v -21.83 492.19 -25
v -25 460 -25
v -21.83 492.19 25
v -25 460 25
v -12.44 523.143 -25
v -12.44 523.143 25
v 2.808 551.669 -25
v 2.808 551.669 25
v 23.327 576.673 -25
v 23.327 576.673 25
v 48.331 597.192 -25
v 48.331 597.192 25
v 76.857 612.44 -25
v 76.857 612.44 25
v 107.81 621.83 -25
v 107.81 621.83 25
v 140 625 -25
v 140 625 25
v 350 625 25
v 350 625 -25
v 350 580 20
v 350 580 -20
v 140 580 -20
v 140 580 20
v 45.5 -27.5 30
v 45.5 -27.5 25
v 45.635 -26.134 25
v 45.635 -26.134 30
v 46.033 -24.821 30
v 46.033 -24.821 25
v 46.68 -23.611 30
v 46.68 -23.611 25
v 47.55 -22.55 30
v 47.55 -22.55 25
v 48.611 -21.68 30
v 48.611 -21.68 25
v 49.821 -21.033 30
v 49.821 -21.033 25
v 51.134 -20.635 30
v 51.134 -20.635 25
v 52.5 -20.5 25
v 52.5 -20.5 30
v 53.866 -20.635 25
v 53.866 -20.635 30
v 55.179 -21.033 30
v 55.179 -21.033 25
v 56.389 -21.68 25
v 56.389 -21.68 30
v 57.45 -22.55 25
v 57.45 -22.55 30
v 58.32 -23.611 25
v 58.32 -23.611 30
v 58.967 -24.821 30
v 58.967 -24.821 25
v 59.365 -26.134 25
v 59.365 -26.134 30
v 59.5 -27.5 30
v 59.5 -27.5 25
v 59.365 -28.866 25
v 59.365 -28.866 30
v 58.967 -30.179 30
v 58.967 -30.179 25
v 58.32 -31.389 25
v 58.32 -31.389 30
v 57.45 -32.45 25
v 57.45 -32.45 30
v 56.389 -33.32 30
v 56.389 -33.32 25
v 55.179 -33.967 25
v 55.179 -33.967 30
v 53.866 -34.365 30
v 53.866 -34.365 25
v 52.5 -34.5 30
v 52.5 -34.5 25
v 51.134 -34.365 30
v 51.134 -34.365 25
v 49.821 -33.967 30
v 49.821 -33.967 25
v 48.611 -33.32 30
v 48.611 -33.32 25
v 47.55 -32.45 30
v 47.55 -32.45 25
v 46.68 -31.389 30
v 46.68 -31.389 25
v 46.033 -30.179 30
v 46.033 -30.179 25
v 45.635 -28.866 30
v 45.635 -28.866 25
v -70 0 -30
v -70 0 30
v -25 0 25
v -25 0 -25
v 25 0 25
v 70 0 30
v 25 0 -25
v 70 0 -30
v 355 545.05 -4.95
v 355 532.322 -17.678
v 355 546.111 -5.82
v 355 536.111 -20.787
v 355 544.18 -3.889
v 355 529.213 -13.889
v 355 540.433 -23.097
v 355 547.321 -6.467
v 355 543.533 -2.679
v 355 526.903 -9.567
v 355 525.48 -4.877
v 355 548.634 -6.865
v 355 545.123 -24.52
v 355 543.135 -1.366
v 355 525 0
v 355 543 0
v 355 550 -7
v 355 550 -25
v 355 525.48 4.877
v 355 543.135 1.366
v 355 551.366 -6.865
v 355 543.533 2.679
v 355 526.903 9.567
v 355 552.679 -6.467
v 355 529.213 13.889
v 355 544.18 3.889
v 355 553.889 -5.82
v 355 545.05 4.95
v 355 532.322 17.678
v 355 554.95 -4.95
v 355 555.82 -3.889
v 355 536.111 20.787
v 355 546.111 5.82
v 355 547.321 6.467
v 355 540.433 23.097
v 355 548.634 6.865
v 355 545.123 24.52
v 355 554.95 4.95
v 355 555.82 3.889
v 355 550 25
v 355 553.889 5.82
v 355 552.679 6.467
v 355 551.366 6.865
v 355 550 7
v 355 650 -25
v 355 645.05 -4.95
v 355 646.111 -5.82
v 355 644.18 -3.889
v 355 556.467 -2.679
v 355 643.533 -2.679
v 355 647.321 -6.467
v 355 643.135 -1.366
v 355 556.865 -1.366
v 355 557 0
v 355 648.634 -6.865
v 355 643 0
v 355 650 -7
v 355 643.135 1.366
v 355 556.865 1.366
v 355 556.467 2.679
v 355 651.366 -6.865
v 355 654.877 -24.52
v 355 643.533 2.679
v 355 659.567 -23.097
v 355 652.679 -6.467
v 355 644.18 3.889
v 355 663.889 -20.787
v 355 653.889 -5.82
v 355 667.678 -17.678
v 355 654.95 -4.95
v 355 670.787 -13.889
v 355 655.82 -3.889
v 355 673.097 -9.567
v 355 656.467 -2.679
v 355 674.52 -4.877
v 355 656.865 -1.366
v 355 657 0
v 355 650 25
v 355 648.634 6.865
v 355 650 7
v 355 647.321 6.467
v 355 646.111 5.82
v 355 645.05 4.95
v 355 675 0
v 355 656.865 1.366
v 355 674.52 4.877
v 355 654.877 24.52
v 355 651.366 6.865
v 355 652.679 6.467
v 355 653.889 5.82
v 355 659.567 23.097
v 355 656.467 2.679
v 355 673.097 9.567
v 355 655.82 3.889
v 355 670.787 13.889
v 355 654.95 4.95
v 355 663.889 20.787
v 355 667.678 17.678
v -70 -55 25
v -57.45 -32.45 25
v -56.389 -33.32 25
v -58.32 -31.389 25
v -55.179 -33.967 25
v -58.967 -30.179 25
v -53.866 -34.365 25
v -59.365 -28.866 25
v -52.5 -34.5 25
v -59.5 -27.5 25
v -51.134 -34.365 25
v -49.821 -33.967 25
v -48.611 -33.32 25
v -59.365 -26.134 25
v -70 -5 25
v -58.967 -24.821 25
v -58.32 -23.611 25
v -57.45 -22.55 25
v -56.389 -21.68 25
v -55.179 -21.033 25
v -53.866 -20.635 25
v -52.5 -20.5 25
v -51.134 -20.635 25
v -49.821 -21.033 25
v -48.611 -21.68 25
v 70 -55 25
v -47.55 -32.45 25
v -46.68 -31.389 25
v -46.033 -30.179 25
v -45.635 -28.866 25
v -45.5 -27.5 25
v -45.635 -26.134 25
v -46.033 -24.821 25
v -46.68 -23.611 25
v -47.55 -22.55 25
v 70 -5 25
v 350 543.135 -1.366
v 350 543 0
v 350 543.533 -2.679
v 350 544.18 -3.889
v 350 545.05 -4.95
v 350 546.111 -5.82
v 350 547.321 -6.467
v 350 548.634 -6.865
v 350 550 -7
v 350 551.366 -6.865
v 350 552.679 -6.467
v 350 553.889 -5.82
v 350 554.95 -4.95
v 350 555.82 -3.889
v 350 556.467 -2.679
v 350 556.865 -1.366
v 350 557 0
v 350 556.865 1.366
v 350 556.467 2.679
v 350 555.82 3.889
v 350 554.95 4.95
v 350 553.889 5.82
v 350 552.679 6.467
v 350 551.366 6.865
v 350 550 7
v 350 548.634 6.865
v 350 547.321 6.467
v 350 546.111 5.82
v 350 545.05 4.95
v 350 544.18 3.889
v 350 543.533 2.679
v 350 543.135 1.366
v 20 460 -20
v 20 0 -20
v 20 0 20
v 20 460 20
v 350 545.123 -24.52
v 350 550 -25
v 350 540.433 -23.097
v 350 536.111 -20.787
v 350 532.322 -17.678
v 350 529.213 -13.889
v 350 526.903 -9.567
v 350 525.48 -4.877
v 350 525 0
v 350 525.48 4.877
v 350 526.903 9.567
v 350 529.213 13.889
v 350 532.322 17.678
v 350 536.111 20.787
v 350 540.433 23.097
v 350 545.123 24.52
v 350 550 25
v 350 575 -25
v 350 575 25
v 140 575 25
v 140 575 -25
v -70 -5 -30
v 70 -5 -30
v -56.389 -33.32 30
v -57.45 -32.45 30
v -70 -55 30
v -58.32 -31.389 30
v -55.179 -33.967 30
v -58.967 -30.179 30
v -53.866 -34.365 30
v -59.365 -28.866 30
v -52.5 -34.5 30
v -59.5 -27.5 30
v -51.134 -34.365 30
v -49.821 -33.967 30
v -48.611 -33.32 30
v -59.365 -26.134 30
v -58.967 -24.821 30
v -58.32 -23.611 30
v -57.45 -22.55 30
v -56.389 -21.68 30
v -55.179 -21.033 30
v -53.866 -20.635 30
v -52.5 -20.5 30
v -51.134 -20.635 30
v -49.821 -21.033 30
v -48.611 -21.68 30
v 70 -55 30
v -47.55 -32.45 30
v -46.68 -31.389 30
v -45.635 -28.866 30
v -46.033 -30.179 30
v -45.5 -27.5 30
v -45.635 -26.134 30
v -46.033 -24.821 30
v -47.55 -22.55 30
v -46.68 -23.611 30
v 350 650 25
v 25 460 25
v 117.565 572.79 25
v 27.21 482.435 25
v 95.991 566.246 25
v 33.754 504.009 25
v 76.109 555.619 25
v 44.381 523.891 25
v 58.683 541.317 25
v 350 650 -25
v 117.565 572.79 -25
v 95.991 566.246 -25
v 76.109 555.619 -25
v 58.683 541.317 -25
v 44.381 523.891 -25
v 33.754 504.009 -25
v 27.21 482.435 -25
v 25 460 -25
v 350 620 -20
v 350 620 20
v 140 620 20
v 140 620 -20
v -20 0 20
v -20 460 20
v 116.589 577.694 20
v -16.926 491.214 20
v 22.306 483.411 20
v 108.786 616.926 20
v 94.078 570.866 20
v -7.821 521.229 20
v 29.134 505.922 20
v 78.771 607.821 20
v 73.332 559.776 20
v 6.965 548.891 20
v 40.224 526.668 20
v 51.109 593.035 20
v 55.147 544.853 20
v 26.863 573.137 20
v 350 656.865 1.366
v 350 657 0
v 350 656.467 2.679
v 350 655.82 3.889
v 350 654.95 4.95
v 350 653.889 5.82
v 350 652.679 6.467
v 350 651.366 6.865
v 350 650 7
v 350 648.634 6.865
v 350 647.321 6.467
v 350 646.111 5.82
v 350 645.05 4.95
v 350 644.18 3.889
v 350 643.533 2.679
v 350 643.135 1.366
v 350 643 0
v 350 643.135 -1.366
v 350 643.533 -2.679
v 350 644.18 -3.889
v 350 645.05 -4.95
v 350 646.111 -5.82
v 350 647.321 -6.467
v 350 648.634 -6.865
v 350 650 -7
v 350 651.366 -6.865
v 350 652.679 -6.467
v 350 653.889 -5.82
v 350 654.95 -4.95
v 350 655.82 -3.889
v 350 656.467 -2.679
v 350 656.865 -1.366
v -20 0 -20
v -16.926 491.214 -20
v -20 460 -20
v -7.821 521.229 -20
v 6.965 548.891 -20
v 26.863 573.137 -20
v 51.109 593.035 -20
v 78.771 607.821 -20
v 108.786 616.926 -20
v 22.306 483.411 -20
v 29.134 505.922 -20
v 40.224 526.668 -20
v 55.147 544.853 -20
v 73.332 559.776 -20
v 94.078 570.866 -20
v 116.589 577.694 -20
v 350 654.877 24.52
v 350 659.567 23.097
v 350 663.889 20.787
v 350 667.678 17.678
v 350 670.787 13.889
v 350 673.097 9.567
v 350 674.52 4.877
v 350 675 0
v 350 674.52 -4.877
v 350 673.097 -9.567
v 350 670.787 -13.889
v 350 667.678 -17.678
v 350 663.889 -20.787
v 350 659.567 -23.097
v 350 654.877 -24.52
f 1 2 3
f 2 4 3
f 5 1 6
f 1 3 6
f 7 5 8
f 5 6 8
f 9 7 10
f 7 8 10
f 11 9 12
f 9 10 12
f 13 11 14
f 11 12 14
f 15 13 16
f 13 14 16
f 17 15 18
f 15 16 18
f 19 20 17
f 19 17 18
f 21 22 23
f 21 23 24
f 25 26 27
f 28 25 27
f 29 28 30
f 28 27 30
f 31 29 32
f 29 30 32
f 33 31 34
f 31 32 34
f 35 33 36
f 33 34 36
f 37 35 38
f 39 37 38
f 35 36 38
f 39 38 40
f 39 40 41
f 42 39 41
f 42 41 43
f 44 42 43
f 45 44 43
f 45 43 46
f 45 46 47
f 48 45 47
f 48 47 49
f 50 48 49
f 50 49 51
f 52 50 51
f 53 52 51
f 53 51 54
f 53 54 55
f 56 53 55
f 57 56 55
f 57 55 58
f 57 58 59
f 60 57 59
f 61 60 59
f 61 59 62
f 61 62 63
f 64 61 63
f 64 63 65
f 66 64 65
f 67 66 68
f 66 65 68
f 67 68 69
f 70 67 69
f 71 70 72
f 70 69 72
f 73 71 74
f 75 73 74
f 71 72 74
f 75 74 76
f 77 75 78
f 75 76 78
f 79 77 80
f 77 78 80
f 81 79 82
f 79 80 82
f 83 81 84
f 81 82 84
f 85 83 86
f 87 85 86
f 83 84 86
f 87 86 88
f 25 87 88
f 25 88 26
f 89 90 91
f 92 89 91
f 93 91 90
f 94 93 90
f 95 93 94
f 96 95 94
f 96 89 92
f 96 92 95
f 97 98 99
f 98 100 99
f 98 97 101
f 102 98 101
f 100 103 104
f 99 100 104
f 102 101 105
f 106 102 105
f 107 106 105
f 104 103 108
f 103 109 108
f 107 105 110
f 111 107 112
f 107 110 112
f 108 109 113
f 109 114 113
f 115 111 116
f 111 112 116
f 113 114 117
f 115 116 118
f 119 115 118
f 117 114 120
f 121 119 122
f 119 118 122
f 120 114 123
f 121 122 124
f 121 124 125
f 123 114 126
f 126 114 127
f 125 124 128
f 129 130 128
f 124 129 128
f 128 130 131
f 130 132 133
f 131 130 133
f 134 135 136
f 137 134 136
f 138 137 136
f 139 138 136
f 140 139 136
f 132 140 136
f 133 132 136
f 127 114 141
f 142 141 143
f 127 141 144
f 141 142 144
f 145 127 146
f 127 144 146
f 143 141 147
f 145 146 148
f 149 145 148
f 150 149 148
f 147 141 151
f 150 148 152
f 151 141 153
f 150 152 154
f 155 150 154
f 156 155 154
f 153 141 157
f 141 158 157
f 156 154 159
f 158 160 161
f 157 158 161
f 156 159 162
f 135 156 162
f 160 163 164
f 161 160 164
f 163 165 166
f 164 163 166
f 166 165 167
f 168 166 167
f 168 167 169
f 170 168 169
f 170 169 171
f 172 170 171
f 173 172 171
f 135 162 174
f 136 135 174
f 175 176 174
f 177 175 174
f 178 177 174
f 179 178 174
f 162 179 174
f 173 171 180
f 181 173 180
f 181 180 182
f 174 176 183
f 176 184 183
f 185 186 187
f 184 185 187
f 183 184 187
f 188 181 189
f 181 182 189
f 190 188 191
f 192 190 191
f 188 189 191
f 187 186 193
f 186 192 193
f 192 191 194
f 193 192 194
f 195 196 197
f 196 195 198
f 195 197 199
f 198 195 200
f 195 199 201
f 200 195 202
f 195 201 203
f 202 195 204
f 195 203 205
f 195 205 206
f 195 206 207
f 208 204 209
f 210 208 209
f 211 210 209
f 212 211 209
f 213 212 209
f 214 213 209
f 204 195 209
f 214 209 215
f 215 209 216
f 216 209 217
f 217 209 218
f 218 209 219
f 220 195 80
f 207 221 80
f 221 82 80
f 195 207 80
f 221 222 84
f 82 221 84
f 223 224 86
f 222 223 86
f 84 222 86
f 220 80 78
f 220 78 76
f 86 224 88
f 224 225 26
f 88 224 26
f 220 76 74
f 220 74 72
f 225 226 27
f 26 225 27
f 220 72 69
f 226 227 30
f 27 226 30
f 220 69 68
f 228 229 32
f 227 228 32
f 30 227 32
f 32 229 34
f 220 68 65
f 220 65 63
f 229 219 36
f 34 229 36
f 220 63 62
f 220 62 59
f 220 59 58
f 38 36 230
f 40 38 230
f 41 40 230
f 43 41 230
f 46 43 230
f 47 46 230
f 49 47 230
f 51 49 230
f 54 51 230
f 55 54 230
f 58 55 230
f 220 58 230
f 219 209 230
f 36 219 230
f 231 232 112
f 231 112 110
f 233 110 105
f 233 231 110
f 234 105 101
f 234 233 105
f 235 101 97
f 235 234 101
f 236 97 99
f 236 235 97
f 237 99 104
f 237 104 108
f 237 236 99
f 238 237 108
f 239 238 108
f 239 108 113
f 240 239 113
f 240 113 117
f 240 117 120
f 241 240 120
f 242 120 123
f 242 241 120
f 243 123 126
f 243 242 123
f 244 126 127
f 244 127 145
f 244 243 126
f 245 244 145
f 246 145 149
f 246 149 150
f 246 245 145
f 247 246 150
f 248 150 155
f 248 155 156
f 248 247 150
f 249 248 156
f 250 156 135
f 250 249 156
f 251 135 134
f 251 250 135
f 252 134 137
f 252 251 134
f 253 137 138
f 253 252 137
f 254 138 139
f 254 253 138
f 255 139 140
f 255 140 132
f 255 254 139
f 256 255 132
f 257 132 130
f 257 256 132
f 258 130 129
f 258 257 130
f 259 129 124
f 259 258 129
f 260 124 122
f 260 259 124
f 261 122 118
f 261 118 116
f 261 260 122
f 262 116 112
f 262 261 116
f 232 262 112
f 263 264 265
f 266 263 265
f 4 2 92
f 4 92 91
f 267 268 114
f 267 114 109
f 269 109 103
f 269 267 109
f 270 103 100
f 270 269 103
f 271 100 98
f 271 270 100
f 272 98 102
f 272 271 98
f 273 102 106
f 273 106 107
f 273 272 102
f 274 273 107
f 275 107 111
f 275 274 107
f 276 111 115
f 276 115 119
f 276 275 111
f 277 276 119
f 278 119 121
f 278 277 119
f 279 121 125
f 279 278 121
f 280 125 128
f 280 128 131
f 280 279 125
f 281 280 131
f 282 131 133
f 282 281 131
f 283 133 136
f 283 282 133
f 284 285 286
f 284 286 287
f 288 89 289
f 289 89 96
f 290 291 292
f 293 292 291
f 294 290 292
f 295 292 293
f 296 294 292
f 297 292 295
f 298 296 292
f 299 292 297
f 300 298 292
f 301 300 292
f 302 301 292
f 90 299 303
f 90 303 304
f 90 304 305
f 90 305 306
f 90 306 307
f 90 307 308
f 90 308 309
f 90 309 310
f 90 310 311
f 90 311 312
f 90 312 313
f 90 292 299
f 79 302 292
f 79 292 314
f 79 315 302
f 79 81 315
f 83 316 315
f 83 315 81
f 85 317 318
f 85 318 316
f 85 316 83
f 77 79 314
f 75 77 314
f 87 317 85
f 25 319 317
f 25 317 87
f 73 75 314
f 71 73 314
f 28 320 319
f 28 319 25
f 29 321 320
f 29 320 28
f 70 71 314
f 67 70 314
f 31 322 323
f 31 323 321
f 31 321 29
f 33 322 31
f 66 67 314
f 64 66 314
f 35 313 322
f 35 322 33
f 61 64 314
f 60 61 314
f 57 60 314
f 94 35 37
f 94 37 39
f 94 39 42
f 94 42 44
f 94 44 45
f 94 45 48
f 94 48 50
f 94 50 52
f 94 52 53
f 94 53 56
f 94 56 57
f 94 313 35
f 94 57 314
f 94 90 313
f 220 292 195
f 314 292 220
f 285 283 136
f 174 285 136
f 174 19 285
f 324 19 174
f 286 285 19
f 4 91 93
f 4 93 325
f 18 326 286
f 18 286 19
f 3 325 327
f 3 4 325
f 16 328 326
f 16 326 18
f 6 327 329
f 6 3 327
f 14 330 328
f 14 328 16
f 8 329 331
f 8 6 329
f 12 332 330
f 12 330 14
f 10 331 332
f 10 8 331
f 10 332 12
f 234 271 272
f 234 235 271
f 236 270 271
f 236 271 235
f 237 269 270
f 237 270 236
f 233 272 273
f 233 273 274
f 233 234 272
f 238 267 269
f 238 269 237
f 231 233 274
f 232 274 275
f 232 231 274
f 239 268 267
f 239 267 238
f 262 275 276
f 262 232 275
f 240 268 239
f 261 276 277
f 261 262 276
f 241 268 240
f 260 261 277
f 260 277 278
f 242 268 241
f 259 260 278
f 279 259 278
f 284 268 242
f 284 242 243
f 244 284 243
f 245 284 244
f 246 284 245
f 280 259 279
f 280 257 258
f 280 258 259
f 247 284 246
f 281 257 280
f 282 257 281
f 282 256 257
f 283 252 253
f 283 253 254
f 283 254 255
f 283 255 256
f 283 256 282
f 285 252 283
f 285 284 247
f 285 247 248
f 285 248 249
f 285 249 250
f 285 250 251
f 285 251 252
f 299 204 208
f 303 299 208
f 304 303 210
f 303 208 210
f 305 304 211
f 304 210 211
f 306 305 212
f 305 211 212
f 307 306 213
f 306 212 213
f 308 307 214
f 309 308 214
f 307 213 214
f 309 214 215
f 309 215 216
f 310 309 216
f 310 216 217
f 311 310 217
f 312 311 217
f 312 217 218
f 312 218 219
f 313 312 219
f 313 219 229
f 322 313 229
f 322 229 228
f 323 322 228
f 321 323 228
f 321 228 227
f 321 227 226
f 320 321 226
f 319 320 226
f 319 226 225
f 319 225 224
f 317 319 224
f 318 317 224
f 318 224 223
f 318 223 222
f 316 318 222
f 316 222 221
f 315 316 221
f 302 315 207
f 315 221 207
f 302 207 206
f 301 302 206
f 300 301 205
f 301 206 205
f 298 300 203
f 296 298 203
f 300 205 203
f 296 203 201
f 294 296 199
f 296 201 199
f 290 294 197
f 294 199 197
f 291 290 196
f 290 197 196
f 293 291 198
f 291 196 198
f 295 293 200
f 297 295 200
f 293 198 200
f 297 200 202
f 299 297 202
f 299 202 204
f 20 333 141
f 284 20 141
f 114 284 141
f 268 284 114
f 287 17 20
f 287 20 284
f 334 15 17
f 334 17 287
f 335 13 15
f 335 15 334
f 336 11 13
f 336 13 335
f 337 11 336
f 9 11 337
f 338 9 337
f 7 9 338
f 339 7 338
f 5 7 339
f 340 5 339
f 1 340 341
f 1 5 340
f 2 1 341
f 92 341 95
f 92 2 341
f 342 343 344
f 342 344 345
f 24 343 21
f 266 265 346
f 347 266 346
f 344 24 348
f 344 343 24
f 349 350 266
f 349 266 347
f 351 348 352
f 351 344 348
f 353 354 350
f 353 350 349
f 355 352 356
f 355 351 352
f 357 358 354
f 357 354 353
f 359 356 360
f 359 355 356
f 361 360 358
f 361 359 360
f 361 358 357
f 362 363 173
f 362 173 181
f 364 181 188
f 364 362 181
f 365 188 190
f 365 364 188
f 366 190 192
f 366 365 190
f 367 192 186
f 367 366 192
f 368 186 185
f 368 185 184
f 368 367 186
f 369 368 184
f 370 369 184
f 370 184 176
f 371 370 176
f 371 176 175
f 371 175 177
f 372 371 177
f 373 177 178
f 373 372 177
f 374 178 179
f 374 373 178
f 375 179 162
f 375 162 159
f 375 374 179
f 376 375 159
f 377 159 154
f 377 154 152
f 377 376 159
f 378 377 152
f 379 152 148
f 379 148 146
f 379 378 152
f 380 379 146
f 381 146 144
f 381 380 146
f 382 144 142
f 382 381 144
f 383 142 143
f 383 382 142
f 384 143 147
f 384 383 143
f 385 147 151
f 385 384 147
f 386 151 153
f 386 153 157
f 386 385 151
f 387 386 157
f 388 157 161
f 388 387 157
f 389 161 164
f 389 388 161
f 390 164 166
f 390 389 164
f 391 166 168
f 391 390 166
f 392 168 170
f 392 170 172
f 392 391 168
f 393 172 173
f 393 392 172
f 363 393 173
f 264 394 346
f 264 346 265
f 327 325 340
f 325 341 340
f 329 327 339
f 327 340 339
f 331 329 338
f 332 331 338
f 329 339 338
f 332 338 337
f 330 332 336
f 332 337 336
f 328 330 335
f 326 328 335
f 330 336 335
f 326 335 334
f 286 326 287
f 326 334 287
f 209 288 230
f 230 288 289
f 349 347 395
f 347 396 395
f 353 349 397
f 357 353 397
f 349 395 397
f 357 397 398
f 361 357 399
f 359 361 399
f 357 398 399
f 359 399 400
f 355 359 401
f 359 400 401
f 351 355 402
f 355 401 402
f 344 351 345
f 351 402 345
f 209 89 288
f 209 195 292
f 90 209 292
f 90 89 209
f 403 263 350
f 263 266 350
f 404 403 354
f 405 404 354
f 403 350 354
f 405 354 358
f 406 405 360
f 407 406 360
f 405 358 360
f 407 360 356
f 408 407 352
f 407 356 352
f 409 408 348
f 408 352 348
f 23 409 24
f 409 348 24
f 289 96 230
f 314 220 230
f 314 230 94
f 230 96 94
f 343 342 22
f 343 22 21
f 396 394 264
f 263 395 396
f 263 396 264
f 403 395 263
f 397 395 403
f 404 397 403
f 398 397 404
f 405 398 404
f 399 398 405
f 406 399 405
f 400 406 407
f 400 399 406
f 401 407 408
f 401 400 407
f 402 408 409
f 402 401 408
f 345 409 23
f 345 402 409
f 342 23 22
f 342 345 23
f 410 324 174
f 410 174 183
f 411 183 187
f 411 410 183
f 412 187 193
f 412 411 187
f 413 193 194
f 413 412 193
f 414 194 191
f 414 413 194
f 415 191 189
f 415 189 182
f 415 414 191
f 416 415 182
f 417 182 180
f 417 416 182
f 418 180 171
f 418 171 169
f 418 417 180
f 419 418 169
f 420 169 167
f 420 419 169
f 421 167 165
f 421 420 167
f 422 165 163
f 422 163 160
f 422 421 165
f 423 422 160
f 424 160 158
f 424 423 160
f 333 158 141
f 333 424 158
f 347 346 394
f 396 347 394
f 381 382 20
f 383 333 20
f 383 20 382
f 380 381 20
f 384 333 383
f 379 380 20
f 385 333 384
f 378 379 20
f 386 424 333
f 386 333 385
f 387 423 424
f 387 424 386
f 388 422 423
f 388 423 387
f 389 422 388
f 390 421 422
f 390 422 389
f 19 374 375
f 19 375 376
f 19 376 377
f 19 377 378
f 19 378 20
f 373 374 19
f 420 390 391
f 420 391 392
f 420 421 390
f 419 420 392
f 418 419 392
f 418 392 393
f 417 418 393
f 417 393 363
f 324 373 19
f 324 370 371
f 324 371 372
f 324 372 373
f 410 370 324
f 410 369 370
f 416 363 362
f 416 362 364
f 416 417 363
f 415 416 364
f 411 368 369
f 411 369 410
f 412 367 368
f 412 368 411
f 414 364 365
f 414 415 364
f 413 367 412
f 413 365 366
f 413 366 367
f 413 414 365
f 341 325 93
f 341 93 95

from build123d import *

# Parameters (mm, degrees)
SKETCH2_W           = 140
SKETCH2_H           = 60
BOSS_EXTRUDE2_DEPTH = 5
SKETCH3_W           = 140
SKETCH3_H           = 5
BOSS_EXTRUDE3_DEPTH = 50
SKETCH4_R           = 7
CUT_EXTRUDE1_DEPTH  = 108.354552768
SKETCH6_W           = 50
SKETCH6_H           = 50
SKETCH6_W_2         = 40
SKETCH6_H_2         = 40
SKETCH7_R           = 7
BOSS_EXTRUDE4_DEPTH = 5
SKETCH8_W           = 140
SKETCH8_H           = 50
CUT_EXTRUDE2_DEPTH  = 5


with BuildPart() as part:
    # Sketch2 → Boss-Extrude2 (new body)
    with BuildSketch(Plane(origin=(0, 0, 0), x_dir=(1, 0, 0), z_dir=(0, 1, 0))):
        Rectangle(SKETCH2_W, SKETCH2_H)
    extrude(amount=-BOSS_EXTRUDE2_DEPTH)

    # Sketch3 → Boss-Extrude3 (add)
    with BuildSketch(Plane.XZ.offset(5)):
        with Locations((0, -27.5)):
            Rectangle(SKETCH3_W, SKETCH3_H)
        with Locations((0, 27.5)):
            Rectangle(SKETCH3_W, SKETCH3_H)
    extrude(amount=BOSS_EXTRUDE3_DEPTH)

    # Sketch4 → Cut-Extrude1 (cut, through all)
    with BuildSketch(Plane(origin=(0, 0, -30), x_dir=(-1, 0, 0), z_dir=(0, 0, -1))):
        with Locations((-52.5, -27.5)):
            Circle(SKETCH4_R)
        with Locations((52.5, -27.5)):
            Circle(SKETCH4_R)
    extrude(amount=-CUT_EXTRUDE1_DEPTH, mode=Mode.SUBTRACT)

    # Sweep1: sweep along a path in Sketch5
    with BuildLine(Plane.XY) as sweep1_path:
        Line((0, 0), (0, 460))
        ThreePointArc((0, 460), (41.005050634, 558.994949366), (140, 600))
        Line((140, 600), (350, 600))
    # Sketch6 → Sweep1 (sweep)
    with BuildSketch(Plane(origin=(0, 0, 0), x_dir=(1, 0, 0), z_dir=(0, 1, 0))):
        Rectangle(SKETCH6_W, SKETCH6_H)
        Rectangle(SKETCH6_W_2, SKETCH6_H_2, mode=Mode.SUBTRACT)
    sweep(path=sweep1_path.line)

    # Sketch7 → Boss-Extrude4 (add)
    with BuildSketch(Plane(origin=(350, 0, 0), x_dir=(0, 0, -1), z_dir=(1, 0, 0))):
        with BuildLine():
            Line((-25, 550), (-25, 650))
            ThreePointArc((-25, 650), (0, 675), (25, 650))
            Line((25, 650), (25, 550))
            ThreePointArc((25, 550), (0, 525), (-25, 550))
        make_face()
        with Locations(Location((0, 650, 0), (0, 0, 90))):
            Circle(SKETCH7_R, mode=Mode.SUBTRACT)
        with Locations(Location((0, 550, 0), (0, 0, 270))):
            Circle(SKETCH7_R, mode=Mode.SUBTRACT)
    extrude(amount=BOSS_EXTRUDE4_DEPTH)

    # Sketch8 → Cut-Extrude2 (cut)
    with BuildSketch(Plane(origin=(0, 0, -30), x_dir=(-1, 0, 0), z_dir=(0, 0, -1))):
        with Locations((0, -30)):
            Rectangle(SKETCH8_W, SKETCH8_H)
    extrude(amount=-CUT_EXTRUDE2_DEPTH, mode=Mode.SUBTRACT)


solid = part.part
